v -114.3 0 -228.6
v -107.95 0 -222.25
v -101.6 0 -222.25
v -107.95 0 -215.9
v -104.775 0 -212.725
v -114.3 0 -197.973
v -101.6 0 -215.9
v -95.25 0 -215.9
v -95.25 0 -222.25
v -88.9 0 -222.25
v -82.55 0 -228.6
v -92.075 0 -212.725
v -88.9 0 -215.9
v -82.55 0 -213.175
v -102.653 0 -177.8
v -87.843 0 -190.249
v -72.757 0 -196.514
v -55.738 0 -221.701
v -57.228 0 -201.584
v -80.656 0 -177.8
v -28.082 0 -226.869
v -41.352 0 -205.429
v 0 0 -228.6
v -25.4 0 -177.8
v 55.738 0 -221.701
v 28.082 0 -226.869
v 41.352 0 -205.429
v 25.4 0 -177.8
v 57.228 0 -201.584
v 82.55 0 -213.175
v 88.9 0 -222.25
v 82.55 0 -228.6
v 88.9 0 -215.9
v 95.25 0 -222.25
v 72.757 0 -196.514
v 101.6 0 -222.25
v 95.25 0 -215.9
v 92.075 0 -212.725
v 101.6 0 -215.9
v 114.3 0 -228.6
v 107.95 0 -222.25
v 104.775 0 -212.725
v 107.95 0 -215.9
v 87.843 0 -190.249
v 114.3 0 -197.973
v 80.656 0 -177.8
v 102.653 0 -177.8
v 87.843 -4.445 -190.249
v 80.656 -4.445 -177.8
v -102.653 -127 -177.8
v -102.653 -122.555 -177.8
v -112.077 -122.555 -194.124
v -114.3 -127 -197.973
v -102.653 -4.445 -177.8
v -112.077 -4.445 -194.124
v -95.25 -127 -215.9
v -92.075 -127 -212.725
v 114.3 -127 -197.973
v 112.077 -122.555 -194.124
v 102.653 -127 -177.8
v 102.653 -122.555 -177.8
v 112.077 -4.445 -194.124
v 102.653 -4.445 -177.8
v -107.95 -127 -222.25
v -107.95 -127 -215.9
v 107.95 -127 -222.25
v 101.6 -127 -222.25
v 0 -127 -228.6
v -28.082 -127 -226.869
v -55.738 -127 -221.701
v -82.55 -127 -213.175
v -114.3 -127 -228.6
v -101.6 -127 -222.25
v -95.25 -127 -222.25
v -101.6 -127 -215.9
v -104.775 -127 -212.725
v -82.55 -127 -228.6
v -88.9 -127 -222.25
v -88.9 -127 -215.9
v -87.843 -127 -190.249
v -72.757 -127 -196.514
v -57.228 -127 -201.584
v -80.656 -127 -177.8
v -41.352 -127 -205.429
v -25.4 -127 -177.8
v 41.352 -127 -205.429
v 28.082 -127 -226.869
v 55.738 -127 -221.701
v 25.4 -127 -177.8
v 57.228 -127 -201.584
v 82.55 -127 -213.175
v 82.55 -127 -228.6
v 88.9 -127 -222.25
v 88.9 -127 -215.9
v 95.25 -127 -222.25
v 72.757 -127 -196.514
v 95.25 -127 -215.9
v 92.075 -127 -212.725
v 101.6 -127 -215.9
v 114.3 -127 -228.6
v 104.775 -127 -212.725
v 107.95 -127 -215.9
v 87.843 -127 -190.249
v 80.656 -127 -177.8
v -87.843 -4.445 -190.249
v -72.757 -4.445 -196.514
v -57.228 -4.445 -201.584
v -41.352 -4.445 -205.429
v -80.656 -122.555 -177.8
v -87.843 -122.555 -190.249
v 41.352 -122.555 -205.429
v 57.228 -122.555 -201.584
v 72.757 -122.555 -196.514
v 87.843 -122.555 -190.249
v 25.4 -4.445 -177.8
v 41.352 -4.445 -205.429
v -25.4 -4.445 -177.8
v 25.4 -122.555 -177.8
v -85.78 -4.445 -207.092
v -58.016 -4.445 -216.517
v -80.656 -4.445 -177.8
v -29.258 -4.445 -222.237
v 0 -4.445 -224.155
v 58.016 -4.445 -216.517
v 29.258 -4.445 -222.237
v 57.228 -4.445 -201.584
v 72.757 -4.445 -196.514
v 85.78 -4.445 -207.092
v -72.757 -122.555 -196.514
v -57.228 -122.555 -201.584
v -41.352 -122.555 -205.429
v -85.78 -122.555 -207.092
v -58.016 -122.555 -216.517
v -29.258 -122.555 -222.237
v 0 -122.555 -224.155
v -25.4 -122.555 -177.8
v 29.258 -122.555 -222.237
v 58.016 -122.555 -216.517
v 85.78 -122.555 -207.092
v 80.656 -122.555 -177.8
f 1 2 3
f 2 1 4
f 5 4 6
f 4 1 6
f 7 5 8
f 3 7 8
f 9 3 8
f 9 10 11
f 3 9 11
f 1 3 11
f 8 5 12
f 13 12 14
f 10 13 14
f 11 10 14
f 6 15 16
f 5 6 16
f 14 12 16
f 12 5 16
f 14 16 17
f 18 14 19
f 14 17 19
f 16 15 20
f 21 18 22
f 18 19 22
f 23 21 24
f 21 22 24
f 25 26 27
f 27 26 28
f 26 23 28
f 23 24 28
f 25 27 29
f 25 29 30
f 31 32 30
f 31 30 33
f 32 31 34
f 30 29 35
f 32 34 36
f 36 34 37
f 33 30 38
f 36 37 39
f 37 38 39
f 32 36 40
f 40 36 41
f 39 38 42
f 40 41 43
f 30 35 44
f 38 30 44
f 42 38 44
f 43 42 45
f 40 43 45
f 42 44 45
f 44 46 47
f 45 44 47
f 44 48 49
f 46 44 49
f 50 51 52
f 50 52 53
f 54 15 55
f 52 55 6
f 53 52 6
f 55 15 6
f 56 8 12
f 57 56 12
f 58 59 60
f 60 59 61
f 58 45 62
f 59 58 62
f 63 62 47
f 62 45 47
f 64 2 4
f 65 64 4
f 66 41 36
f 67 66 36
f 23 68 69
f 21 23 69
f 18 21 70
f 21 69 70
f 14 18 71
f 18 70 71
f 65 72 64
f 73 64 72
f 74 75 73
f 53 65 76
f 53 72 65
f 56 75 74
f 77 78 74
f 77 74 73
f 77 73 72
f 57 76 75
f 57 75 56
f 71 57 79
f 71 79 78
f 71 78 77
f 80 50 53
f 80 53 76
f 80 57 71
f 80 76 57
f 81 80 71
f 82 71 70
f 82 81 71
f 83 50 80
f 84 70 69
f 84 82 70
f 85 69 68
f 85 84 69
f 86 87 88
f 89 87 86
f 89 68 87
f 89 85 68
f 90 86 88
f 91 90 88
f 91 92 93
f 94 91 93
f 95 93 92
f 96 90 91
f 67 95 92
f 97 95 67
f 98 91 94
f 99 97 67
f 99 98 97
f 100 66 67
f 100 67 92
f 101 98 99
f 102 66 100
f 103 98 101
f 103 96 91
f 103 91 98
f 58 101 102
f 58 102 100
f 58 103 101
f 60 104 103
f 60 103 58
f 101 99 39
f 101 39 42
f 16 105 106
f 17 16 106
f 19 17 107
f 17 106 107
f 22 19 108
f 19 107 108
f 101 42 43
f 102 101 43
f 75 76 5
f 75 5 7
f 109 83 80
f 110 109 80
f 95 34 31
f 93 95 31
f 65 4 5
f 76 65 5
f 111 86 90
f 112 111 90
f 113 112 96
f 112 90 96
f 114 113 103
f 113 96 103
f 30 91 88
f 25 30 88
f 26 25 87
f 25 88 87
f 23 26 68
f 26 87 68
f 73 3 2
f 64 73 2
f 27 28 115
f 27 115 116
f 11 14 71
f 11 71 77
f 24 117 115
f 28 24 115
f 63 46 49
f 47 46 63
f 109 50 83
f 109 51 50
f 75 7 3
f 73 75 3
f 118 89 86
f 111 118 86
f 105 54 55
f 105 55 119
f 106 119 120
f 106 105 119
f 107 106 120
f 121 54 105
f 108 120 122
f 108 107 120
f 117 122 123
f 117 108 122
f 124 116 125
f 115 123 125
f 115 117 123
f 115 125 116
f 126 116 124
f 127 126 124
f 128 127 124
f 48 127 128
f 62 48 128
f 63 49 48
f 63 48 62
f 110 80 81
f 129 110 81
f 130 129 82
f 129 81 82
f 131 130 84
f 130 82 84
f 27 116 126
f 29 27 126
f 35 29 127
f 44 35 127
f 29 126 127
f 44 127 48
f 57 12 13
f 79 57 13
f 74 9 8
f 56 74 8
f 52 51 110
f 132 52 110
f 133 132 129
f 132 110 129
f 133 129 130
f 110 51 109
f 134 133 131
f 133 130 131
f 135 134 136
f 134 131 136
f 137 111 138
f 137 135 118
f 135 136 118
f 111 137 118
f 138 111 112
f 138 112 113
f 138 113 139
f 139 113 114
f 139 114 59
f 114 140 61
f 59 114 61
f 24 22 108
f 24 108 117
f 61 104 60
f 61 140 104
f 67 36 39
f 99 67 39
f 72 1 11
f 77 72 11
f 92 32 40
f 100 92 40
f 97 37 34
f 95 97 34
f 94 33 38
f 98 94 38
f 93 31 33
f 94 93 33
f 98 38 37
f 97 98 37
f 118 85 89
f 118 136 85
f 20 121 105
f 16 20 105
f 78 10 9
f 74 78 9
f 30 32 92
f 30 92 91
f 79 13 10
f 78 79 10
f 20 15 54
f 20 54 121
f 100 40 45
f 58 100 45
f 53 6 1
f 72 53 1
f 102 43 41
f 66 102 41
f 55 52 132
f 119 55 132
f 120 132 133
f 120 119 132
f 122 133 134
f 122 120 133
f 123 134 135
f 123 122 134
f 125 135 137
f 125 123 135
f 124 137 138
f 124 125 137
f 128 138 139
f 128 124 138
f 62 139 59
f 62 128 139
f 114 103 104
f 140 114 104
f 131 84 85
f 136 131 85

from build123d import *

# Parameters (mm, degrees)
F1_DEPTH  = 127
F2_T      = 4.445
F3_R      = 9.525
F4_DEPTH  = 127
F6_DEPTH  = 127
F8_DEPTH  = 154.94
F10_DEPTH = 4.445
F14_DEPTH = 127


# Not quite as in the source:
# - a shell that OpenCascade refuses in one call is made with other operations: the cavity is built on its own and cut out


with BuildPart() as f1:
    # F0 (on Front) → F1 (new body)
    with BuildSketch(Plane.XZ):
        with BuildLine():
            Line((-19.05, -32.9955678842), (-114.3, -197.9734073051))
            ThreePointArc((-114.3, -197.9734073051), (0, -228.6), (114.3, -197.9734073051))
            Line((114.3, -197.9734073051), (19.05, -32.9955678842))
            ThreePointArc((19.05, -32.9955678842), (32.9955678842, -19.05), (38.1, 0))
            ThreePointArc((38.1, 0), (0, 38.1), (-38.1, 0))
            ThreePointArc((-38.1, 0), (-32.9955678842, -19.05), (-19.05, -32.9955678842))
        make_face()
    extrude(amount=F1_DEPTH)

    # F2: shell of thickness 4.445, made by hand


with BuildPart() as f2_core1:
    # F2_t2: copy of F1
    add(f1.part)

    # the walls: a layer under each face that stays
    f2_faces = [f2_core1.faces().sort_by_distance(p)[0] for p in [
        (0, -127, -95.25),
        (0, 0, -95.25),
        (0, -63.5, -228.6),
        (-32.9955678842, -63.5, -19.05),
    ]]
    thicken(f2_faces, amount=-F2_T, mode=Mode.SUBTRACT)


with BuildPart() as f1_1:
    add(f1.part)

    # what is left inside the walls is the cavity
    f2_cavity = [f2_core1.part.solids().sort_by_distance(p)[0] for p in [
        (0, -122.51055, -136.736667),
    ]]
    add(f2_cavity, mode=Mode.SUBTRACT)

    # F3 (on face) → F4 (cut, through all)
    with BuildSketch(Plane.XZ.offset(127)):
        with BuildLine():
            Line((-50.6196632626, -125.7758286329), (-87.8433632626, -190.2491682786))
            ThreePointArc((-87.8433632626, -190.2491682786), (-48.4057129805, -203.8825383667), (-7.0486462544, -209.4314185741))
            Line((-7.0486462544, -209.4314185741), (-7.0486462544, -169.3468456411))
            Line((-7.0486462544, -169.3468456411), (-50.6196632626, -125.7758286329))
        make_face()
        with BuildLine():
            Line((87.8433632626, -190.2491682786), (50.6196632626, -125.7758286329))
            Line((50.6196632626, -125.7758286329), (7.0486462544, -169.3468456411))
            Line((7.0486462544, -169.3468456411), (7.0486462544, -209.4314185741))
            ThreePointArc((7.0486462544, -209.4314185741), (48.4057129805, -203.8825383667), (87.8433632626, -190.2491682786))
        make_face()
        with BuildLine():
            Line((44.2696632626, -114.7773060049), (7.0486462544, -50.3086134373))
            Line((7.0486462544, -50.3086134373), (7.0486462544, -125.901221947))
            ThreePointArc((7.0486462544, -125.901221947), (11.356209976, -128.3041542134), (14.9024469628, -131.7324762409))
            Line((14.9024469628, -131.7324762409), (44.2696632626, -114.7773060049))
        make_face()
        with BuildLine():
            Line((-7.0486462544, -125.901221947), (-7.0486462544, -50.3086134373))
            Line((-7.0486462544, -50.3086134373), (-44.2696632626, -114.7773060049))
            Line((-44.2696632626, -114.7773060049), (-14.9024469628, -131.7324762409))
            ThreePointArc((-14.9024469628, -131.7324762409), (-11.356209976, -128.3041542134), (-7.0486462544, -125.901221947))
        make_face()
        Circle(F3_R)
    extrude(amount=-F4_DEPTH, mode=Mode.SUBTRACT)

    # F5 (on Front) → F6 (join, through all)
    with BuildSketch(Plane.XZ):
        with BuildLine():
            ThreePointArc((114.3, -197.9734073051), (59.1660337104, -220.8106438897), (0, -228.6))
            Line((0, -228.6), (114.3, -228.6))
            Line((114.3, -228.6), (114.3, -197.9734073051))
        make_face()
        Polygon((95.25, -222.25), (88.9, -222.25), (88.9, -215.9), (92.075, -212.725), (95.25, -215.9), align=None, mode=Mode.SUBTRACT)
        Polygon((107.95, -215.9), (107.95, -222.25), (101.6, -222.25), (101.6, -215.9), (104.775, -212.725), align=None, mode=Mode.SUBTRACT)
        with BuildLine():
            Line((-114.3, -228.6), (0, -228.6))
            ThreePointArc((0, -228.6), (-59.1660337104, -220.8106438897), (-114.3, -197.9734073051))
            Line((-114.3, -197.9734073051), (-114.3, -228.6))
        make_face()
        Polygon((-104.775, -212.725), (-101.6, -215.9), (-101.6, -222.25), (-107.95, -222.25), (-107.95, -215.9), align=None, mode=Mode.SUBTRACT)
        Polygon((-92.075, -212.725), (-88.9, -215.9), (-88.9, -222.25), (-95.25, -222.25), (-95.25, -215.9), align=None, mode=Mode.SUBTRACT)
    extrude(amount=F6_DEPTH)

    # F7 (on Front) → F8 (cut)
    with BuildSketch(Plane.XZ):
        Polygon((-155.1303118467, -177.8), (0, -177.8), (122.5007101893, -177.8), (122.5007101893, 99.952660501), (-155.1303118467, 97.6831391454), align=None)
    extrude(amount=F8_DEPTH, mode=Mode.SUBTRACT)

    # F9 (on face) → F10 (join, through all)
    with BuildSketch(Plane(origin=(0, 0, 0), x_dir=(-1, 0, 0), z_dir=(0, 1, 0))):
        with BuildLine():
            ThreePointArc((-41.3518280797, -205.4293767076), (-65.0419791249, -199.2002596673), (-87.8433632626, -190.2491682786))
            Line((-87.8433632626, -190.2491682786), (-80.6558326058, -177.8))
            Line((-80.6558326058, -177.8), (-102.6528778619, -177.8))
            Line((-102.6528778619, -177.8), (-114.3, -197.9734073051))
            Line((-114.3, -197.9734073051), (-114.3, -228.6))
            Line((-114.3, -228.6), (114.3, -228.6))
            Line((114.3, -228.6), (114.3, -197.9734073051))
            Line((114.3, -197.9734073051), (102.6528778619, -177.8))
            Line((102.6528778619, -177.8), (80.6558326058, -177.8))
            Line((80.6558326058, -177.8), (87.8433632626, -190.2491682786))
            ThreePointArc((87.8433632626, -190.2491682786), (65.0419791249, -199.2002596673), (41.3518280797, -205.4293767076))
            ThreePointArc((41.3518280797, -205.4293767076), (24.2828244592, -208.1382880113), (7.0486462544, -209.4314185741))
            Line((7.0486462544, -209.4314185741), (7.0486462544, -177.8))
            Line((7.0486462544, -177.8), (0, -177.8))
            Line((0, -177.8), (-7.0486462544, -177.8))
            Line((-7.0486462544, -177.8), (-7.0486462544, -209.4314185741))
            ThreePointArc((-7.0486462544, -209.4314185741), (-24.2828244592, -208.1382880113), (-41.3518280797, -205.4293767076))
        make_face()
        Polygon((-107.95, -222.25), (-107.95, -215.9), (-104.775, -212.725), (-101.6, -215.9), (-101.6, -222.25), align=None, mode=Mode.SUBTRACT)
        Polygon((-88.9, -215.9), (-88.9, -222.25), (-95.25, -222.25), (-95.25, -215.9), (-92.075, -212.725), align=None, mode=Mode.SUBTRACT)
        Polygon((88.9, -215.9), (92.075, -212.725), (95.25, -215.9), (95.25, -222.25), (88.9, -222.25), align=None, mode=Mode.SUBTRACT)
        Polygon((101.6, -222.25), (101.6, -215.9), (104.775, -212.725), (107.95, -215.9), (107.95, -222.25), align=None, mode=Mode.SUBTRACT)
        with BuildLine():
            Line((-25.4, -177.8), (-41.3518280797, -205.4293767076))
            ThreePointArc((-41.3518280797, -205.4293767076), (-24.2828244592, -208.1382880113), (-7.0486462544, -209.4314185741))
            Line((-7.0486462544, -209.4314185741), (-7.0486462544, -177.8))
            Line((-7.0486462544, -177.8), (-25.4, -177.8))
        make_face()
        with BuildLine():
            Line((25.4, -177.8), (7.0486462544, -177.8))
            Line((7.0486462544, -177.8), (7.0486462544, -209.4314185741))
            ThreePointArc((7.0486462544, -209.4314185741), (24.2828244592, -208.1382880113), (41.3518280797, -205.4293767076))
            Line((41.3518280797, -205.4293767076), (25.4, -177.8))
        make_face()
    extrude(amount=-F10_DEPTH)

    # F12: F1 across plane


with BuildPart() as f1_2:
    add(f1_1.part)
    add(f1_1.part.mirror(Plane(origin=(0, -63.5, -104.9820841324), x_dir=(1, 0, 0), z_dir=(0, -1, 0))))

    # F13 (on face) → F14 (cut, through all)
    with BuildSketch(Plane.XZ.offset(127)):
        with BuildLine():
            ThreePointArc((0, -228.6), (-41.9894094809, -224.7105905191), (-82.55, -213.1747112113))
            Line((-82.55, -213.1747112113), (-82.55, -228.6))
            Line((-82.55, -228.6), (0, -228.6))
        make_face()
        with BuildLine():
            ThreePointArc((82.55, -213.1747112113), (41.9894094809, -224.7105905191), (0, -228.6))
            Line((0, -228.6), (82.55, -228.6))
            Line((82.55, -228.6), (82.55, -213.1747112113))
        make_face()
    extrude(amount=-F14_DEPTH, mode=Mode.SUBTRACT)


solid = f1_2.part
